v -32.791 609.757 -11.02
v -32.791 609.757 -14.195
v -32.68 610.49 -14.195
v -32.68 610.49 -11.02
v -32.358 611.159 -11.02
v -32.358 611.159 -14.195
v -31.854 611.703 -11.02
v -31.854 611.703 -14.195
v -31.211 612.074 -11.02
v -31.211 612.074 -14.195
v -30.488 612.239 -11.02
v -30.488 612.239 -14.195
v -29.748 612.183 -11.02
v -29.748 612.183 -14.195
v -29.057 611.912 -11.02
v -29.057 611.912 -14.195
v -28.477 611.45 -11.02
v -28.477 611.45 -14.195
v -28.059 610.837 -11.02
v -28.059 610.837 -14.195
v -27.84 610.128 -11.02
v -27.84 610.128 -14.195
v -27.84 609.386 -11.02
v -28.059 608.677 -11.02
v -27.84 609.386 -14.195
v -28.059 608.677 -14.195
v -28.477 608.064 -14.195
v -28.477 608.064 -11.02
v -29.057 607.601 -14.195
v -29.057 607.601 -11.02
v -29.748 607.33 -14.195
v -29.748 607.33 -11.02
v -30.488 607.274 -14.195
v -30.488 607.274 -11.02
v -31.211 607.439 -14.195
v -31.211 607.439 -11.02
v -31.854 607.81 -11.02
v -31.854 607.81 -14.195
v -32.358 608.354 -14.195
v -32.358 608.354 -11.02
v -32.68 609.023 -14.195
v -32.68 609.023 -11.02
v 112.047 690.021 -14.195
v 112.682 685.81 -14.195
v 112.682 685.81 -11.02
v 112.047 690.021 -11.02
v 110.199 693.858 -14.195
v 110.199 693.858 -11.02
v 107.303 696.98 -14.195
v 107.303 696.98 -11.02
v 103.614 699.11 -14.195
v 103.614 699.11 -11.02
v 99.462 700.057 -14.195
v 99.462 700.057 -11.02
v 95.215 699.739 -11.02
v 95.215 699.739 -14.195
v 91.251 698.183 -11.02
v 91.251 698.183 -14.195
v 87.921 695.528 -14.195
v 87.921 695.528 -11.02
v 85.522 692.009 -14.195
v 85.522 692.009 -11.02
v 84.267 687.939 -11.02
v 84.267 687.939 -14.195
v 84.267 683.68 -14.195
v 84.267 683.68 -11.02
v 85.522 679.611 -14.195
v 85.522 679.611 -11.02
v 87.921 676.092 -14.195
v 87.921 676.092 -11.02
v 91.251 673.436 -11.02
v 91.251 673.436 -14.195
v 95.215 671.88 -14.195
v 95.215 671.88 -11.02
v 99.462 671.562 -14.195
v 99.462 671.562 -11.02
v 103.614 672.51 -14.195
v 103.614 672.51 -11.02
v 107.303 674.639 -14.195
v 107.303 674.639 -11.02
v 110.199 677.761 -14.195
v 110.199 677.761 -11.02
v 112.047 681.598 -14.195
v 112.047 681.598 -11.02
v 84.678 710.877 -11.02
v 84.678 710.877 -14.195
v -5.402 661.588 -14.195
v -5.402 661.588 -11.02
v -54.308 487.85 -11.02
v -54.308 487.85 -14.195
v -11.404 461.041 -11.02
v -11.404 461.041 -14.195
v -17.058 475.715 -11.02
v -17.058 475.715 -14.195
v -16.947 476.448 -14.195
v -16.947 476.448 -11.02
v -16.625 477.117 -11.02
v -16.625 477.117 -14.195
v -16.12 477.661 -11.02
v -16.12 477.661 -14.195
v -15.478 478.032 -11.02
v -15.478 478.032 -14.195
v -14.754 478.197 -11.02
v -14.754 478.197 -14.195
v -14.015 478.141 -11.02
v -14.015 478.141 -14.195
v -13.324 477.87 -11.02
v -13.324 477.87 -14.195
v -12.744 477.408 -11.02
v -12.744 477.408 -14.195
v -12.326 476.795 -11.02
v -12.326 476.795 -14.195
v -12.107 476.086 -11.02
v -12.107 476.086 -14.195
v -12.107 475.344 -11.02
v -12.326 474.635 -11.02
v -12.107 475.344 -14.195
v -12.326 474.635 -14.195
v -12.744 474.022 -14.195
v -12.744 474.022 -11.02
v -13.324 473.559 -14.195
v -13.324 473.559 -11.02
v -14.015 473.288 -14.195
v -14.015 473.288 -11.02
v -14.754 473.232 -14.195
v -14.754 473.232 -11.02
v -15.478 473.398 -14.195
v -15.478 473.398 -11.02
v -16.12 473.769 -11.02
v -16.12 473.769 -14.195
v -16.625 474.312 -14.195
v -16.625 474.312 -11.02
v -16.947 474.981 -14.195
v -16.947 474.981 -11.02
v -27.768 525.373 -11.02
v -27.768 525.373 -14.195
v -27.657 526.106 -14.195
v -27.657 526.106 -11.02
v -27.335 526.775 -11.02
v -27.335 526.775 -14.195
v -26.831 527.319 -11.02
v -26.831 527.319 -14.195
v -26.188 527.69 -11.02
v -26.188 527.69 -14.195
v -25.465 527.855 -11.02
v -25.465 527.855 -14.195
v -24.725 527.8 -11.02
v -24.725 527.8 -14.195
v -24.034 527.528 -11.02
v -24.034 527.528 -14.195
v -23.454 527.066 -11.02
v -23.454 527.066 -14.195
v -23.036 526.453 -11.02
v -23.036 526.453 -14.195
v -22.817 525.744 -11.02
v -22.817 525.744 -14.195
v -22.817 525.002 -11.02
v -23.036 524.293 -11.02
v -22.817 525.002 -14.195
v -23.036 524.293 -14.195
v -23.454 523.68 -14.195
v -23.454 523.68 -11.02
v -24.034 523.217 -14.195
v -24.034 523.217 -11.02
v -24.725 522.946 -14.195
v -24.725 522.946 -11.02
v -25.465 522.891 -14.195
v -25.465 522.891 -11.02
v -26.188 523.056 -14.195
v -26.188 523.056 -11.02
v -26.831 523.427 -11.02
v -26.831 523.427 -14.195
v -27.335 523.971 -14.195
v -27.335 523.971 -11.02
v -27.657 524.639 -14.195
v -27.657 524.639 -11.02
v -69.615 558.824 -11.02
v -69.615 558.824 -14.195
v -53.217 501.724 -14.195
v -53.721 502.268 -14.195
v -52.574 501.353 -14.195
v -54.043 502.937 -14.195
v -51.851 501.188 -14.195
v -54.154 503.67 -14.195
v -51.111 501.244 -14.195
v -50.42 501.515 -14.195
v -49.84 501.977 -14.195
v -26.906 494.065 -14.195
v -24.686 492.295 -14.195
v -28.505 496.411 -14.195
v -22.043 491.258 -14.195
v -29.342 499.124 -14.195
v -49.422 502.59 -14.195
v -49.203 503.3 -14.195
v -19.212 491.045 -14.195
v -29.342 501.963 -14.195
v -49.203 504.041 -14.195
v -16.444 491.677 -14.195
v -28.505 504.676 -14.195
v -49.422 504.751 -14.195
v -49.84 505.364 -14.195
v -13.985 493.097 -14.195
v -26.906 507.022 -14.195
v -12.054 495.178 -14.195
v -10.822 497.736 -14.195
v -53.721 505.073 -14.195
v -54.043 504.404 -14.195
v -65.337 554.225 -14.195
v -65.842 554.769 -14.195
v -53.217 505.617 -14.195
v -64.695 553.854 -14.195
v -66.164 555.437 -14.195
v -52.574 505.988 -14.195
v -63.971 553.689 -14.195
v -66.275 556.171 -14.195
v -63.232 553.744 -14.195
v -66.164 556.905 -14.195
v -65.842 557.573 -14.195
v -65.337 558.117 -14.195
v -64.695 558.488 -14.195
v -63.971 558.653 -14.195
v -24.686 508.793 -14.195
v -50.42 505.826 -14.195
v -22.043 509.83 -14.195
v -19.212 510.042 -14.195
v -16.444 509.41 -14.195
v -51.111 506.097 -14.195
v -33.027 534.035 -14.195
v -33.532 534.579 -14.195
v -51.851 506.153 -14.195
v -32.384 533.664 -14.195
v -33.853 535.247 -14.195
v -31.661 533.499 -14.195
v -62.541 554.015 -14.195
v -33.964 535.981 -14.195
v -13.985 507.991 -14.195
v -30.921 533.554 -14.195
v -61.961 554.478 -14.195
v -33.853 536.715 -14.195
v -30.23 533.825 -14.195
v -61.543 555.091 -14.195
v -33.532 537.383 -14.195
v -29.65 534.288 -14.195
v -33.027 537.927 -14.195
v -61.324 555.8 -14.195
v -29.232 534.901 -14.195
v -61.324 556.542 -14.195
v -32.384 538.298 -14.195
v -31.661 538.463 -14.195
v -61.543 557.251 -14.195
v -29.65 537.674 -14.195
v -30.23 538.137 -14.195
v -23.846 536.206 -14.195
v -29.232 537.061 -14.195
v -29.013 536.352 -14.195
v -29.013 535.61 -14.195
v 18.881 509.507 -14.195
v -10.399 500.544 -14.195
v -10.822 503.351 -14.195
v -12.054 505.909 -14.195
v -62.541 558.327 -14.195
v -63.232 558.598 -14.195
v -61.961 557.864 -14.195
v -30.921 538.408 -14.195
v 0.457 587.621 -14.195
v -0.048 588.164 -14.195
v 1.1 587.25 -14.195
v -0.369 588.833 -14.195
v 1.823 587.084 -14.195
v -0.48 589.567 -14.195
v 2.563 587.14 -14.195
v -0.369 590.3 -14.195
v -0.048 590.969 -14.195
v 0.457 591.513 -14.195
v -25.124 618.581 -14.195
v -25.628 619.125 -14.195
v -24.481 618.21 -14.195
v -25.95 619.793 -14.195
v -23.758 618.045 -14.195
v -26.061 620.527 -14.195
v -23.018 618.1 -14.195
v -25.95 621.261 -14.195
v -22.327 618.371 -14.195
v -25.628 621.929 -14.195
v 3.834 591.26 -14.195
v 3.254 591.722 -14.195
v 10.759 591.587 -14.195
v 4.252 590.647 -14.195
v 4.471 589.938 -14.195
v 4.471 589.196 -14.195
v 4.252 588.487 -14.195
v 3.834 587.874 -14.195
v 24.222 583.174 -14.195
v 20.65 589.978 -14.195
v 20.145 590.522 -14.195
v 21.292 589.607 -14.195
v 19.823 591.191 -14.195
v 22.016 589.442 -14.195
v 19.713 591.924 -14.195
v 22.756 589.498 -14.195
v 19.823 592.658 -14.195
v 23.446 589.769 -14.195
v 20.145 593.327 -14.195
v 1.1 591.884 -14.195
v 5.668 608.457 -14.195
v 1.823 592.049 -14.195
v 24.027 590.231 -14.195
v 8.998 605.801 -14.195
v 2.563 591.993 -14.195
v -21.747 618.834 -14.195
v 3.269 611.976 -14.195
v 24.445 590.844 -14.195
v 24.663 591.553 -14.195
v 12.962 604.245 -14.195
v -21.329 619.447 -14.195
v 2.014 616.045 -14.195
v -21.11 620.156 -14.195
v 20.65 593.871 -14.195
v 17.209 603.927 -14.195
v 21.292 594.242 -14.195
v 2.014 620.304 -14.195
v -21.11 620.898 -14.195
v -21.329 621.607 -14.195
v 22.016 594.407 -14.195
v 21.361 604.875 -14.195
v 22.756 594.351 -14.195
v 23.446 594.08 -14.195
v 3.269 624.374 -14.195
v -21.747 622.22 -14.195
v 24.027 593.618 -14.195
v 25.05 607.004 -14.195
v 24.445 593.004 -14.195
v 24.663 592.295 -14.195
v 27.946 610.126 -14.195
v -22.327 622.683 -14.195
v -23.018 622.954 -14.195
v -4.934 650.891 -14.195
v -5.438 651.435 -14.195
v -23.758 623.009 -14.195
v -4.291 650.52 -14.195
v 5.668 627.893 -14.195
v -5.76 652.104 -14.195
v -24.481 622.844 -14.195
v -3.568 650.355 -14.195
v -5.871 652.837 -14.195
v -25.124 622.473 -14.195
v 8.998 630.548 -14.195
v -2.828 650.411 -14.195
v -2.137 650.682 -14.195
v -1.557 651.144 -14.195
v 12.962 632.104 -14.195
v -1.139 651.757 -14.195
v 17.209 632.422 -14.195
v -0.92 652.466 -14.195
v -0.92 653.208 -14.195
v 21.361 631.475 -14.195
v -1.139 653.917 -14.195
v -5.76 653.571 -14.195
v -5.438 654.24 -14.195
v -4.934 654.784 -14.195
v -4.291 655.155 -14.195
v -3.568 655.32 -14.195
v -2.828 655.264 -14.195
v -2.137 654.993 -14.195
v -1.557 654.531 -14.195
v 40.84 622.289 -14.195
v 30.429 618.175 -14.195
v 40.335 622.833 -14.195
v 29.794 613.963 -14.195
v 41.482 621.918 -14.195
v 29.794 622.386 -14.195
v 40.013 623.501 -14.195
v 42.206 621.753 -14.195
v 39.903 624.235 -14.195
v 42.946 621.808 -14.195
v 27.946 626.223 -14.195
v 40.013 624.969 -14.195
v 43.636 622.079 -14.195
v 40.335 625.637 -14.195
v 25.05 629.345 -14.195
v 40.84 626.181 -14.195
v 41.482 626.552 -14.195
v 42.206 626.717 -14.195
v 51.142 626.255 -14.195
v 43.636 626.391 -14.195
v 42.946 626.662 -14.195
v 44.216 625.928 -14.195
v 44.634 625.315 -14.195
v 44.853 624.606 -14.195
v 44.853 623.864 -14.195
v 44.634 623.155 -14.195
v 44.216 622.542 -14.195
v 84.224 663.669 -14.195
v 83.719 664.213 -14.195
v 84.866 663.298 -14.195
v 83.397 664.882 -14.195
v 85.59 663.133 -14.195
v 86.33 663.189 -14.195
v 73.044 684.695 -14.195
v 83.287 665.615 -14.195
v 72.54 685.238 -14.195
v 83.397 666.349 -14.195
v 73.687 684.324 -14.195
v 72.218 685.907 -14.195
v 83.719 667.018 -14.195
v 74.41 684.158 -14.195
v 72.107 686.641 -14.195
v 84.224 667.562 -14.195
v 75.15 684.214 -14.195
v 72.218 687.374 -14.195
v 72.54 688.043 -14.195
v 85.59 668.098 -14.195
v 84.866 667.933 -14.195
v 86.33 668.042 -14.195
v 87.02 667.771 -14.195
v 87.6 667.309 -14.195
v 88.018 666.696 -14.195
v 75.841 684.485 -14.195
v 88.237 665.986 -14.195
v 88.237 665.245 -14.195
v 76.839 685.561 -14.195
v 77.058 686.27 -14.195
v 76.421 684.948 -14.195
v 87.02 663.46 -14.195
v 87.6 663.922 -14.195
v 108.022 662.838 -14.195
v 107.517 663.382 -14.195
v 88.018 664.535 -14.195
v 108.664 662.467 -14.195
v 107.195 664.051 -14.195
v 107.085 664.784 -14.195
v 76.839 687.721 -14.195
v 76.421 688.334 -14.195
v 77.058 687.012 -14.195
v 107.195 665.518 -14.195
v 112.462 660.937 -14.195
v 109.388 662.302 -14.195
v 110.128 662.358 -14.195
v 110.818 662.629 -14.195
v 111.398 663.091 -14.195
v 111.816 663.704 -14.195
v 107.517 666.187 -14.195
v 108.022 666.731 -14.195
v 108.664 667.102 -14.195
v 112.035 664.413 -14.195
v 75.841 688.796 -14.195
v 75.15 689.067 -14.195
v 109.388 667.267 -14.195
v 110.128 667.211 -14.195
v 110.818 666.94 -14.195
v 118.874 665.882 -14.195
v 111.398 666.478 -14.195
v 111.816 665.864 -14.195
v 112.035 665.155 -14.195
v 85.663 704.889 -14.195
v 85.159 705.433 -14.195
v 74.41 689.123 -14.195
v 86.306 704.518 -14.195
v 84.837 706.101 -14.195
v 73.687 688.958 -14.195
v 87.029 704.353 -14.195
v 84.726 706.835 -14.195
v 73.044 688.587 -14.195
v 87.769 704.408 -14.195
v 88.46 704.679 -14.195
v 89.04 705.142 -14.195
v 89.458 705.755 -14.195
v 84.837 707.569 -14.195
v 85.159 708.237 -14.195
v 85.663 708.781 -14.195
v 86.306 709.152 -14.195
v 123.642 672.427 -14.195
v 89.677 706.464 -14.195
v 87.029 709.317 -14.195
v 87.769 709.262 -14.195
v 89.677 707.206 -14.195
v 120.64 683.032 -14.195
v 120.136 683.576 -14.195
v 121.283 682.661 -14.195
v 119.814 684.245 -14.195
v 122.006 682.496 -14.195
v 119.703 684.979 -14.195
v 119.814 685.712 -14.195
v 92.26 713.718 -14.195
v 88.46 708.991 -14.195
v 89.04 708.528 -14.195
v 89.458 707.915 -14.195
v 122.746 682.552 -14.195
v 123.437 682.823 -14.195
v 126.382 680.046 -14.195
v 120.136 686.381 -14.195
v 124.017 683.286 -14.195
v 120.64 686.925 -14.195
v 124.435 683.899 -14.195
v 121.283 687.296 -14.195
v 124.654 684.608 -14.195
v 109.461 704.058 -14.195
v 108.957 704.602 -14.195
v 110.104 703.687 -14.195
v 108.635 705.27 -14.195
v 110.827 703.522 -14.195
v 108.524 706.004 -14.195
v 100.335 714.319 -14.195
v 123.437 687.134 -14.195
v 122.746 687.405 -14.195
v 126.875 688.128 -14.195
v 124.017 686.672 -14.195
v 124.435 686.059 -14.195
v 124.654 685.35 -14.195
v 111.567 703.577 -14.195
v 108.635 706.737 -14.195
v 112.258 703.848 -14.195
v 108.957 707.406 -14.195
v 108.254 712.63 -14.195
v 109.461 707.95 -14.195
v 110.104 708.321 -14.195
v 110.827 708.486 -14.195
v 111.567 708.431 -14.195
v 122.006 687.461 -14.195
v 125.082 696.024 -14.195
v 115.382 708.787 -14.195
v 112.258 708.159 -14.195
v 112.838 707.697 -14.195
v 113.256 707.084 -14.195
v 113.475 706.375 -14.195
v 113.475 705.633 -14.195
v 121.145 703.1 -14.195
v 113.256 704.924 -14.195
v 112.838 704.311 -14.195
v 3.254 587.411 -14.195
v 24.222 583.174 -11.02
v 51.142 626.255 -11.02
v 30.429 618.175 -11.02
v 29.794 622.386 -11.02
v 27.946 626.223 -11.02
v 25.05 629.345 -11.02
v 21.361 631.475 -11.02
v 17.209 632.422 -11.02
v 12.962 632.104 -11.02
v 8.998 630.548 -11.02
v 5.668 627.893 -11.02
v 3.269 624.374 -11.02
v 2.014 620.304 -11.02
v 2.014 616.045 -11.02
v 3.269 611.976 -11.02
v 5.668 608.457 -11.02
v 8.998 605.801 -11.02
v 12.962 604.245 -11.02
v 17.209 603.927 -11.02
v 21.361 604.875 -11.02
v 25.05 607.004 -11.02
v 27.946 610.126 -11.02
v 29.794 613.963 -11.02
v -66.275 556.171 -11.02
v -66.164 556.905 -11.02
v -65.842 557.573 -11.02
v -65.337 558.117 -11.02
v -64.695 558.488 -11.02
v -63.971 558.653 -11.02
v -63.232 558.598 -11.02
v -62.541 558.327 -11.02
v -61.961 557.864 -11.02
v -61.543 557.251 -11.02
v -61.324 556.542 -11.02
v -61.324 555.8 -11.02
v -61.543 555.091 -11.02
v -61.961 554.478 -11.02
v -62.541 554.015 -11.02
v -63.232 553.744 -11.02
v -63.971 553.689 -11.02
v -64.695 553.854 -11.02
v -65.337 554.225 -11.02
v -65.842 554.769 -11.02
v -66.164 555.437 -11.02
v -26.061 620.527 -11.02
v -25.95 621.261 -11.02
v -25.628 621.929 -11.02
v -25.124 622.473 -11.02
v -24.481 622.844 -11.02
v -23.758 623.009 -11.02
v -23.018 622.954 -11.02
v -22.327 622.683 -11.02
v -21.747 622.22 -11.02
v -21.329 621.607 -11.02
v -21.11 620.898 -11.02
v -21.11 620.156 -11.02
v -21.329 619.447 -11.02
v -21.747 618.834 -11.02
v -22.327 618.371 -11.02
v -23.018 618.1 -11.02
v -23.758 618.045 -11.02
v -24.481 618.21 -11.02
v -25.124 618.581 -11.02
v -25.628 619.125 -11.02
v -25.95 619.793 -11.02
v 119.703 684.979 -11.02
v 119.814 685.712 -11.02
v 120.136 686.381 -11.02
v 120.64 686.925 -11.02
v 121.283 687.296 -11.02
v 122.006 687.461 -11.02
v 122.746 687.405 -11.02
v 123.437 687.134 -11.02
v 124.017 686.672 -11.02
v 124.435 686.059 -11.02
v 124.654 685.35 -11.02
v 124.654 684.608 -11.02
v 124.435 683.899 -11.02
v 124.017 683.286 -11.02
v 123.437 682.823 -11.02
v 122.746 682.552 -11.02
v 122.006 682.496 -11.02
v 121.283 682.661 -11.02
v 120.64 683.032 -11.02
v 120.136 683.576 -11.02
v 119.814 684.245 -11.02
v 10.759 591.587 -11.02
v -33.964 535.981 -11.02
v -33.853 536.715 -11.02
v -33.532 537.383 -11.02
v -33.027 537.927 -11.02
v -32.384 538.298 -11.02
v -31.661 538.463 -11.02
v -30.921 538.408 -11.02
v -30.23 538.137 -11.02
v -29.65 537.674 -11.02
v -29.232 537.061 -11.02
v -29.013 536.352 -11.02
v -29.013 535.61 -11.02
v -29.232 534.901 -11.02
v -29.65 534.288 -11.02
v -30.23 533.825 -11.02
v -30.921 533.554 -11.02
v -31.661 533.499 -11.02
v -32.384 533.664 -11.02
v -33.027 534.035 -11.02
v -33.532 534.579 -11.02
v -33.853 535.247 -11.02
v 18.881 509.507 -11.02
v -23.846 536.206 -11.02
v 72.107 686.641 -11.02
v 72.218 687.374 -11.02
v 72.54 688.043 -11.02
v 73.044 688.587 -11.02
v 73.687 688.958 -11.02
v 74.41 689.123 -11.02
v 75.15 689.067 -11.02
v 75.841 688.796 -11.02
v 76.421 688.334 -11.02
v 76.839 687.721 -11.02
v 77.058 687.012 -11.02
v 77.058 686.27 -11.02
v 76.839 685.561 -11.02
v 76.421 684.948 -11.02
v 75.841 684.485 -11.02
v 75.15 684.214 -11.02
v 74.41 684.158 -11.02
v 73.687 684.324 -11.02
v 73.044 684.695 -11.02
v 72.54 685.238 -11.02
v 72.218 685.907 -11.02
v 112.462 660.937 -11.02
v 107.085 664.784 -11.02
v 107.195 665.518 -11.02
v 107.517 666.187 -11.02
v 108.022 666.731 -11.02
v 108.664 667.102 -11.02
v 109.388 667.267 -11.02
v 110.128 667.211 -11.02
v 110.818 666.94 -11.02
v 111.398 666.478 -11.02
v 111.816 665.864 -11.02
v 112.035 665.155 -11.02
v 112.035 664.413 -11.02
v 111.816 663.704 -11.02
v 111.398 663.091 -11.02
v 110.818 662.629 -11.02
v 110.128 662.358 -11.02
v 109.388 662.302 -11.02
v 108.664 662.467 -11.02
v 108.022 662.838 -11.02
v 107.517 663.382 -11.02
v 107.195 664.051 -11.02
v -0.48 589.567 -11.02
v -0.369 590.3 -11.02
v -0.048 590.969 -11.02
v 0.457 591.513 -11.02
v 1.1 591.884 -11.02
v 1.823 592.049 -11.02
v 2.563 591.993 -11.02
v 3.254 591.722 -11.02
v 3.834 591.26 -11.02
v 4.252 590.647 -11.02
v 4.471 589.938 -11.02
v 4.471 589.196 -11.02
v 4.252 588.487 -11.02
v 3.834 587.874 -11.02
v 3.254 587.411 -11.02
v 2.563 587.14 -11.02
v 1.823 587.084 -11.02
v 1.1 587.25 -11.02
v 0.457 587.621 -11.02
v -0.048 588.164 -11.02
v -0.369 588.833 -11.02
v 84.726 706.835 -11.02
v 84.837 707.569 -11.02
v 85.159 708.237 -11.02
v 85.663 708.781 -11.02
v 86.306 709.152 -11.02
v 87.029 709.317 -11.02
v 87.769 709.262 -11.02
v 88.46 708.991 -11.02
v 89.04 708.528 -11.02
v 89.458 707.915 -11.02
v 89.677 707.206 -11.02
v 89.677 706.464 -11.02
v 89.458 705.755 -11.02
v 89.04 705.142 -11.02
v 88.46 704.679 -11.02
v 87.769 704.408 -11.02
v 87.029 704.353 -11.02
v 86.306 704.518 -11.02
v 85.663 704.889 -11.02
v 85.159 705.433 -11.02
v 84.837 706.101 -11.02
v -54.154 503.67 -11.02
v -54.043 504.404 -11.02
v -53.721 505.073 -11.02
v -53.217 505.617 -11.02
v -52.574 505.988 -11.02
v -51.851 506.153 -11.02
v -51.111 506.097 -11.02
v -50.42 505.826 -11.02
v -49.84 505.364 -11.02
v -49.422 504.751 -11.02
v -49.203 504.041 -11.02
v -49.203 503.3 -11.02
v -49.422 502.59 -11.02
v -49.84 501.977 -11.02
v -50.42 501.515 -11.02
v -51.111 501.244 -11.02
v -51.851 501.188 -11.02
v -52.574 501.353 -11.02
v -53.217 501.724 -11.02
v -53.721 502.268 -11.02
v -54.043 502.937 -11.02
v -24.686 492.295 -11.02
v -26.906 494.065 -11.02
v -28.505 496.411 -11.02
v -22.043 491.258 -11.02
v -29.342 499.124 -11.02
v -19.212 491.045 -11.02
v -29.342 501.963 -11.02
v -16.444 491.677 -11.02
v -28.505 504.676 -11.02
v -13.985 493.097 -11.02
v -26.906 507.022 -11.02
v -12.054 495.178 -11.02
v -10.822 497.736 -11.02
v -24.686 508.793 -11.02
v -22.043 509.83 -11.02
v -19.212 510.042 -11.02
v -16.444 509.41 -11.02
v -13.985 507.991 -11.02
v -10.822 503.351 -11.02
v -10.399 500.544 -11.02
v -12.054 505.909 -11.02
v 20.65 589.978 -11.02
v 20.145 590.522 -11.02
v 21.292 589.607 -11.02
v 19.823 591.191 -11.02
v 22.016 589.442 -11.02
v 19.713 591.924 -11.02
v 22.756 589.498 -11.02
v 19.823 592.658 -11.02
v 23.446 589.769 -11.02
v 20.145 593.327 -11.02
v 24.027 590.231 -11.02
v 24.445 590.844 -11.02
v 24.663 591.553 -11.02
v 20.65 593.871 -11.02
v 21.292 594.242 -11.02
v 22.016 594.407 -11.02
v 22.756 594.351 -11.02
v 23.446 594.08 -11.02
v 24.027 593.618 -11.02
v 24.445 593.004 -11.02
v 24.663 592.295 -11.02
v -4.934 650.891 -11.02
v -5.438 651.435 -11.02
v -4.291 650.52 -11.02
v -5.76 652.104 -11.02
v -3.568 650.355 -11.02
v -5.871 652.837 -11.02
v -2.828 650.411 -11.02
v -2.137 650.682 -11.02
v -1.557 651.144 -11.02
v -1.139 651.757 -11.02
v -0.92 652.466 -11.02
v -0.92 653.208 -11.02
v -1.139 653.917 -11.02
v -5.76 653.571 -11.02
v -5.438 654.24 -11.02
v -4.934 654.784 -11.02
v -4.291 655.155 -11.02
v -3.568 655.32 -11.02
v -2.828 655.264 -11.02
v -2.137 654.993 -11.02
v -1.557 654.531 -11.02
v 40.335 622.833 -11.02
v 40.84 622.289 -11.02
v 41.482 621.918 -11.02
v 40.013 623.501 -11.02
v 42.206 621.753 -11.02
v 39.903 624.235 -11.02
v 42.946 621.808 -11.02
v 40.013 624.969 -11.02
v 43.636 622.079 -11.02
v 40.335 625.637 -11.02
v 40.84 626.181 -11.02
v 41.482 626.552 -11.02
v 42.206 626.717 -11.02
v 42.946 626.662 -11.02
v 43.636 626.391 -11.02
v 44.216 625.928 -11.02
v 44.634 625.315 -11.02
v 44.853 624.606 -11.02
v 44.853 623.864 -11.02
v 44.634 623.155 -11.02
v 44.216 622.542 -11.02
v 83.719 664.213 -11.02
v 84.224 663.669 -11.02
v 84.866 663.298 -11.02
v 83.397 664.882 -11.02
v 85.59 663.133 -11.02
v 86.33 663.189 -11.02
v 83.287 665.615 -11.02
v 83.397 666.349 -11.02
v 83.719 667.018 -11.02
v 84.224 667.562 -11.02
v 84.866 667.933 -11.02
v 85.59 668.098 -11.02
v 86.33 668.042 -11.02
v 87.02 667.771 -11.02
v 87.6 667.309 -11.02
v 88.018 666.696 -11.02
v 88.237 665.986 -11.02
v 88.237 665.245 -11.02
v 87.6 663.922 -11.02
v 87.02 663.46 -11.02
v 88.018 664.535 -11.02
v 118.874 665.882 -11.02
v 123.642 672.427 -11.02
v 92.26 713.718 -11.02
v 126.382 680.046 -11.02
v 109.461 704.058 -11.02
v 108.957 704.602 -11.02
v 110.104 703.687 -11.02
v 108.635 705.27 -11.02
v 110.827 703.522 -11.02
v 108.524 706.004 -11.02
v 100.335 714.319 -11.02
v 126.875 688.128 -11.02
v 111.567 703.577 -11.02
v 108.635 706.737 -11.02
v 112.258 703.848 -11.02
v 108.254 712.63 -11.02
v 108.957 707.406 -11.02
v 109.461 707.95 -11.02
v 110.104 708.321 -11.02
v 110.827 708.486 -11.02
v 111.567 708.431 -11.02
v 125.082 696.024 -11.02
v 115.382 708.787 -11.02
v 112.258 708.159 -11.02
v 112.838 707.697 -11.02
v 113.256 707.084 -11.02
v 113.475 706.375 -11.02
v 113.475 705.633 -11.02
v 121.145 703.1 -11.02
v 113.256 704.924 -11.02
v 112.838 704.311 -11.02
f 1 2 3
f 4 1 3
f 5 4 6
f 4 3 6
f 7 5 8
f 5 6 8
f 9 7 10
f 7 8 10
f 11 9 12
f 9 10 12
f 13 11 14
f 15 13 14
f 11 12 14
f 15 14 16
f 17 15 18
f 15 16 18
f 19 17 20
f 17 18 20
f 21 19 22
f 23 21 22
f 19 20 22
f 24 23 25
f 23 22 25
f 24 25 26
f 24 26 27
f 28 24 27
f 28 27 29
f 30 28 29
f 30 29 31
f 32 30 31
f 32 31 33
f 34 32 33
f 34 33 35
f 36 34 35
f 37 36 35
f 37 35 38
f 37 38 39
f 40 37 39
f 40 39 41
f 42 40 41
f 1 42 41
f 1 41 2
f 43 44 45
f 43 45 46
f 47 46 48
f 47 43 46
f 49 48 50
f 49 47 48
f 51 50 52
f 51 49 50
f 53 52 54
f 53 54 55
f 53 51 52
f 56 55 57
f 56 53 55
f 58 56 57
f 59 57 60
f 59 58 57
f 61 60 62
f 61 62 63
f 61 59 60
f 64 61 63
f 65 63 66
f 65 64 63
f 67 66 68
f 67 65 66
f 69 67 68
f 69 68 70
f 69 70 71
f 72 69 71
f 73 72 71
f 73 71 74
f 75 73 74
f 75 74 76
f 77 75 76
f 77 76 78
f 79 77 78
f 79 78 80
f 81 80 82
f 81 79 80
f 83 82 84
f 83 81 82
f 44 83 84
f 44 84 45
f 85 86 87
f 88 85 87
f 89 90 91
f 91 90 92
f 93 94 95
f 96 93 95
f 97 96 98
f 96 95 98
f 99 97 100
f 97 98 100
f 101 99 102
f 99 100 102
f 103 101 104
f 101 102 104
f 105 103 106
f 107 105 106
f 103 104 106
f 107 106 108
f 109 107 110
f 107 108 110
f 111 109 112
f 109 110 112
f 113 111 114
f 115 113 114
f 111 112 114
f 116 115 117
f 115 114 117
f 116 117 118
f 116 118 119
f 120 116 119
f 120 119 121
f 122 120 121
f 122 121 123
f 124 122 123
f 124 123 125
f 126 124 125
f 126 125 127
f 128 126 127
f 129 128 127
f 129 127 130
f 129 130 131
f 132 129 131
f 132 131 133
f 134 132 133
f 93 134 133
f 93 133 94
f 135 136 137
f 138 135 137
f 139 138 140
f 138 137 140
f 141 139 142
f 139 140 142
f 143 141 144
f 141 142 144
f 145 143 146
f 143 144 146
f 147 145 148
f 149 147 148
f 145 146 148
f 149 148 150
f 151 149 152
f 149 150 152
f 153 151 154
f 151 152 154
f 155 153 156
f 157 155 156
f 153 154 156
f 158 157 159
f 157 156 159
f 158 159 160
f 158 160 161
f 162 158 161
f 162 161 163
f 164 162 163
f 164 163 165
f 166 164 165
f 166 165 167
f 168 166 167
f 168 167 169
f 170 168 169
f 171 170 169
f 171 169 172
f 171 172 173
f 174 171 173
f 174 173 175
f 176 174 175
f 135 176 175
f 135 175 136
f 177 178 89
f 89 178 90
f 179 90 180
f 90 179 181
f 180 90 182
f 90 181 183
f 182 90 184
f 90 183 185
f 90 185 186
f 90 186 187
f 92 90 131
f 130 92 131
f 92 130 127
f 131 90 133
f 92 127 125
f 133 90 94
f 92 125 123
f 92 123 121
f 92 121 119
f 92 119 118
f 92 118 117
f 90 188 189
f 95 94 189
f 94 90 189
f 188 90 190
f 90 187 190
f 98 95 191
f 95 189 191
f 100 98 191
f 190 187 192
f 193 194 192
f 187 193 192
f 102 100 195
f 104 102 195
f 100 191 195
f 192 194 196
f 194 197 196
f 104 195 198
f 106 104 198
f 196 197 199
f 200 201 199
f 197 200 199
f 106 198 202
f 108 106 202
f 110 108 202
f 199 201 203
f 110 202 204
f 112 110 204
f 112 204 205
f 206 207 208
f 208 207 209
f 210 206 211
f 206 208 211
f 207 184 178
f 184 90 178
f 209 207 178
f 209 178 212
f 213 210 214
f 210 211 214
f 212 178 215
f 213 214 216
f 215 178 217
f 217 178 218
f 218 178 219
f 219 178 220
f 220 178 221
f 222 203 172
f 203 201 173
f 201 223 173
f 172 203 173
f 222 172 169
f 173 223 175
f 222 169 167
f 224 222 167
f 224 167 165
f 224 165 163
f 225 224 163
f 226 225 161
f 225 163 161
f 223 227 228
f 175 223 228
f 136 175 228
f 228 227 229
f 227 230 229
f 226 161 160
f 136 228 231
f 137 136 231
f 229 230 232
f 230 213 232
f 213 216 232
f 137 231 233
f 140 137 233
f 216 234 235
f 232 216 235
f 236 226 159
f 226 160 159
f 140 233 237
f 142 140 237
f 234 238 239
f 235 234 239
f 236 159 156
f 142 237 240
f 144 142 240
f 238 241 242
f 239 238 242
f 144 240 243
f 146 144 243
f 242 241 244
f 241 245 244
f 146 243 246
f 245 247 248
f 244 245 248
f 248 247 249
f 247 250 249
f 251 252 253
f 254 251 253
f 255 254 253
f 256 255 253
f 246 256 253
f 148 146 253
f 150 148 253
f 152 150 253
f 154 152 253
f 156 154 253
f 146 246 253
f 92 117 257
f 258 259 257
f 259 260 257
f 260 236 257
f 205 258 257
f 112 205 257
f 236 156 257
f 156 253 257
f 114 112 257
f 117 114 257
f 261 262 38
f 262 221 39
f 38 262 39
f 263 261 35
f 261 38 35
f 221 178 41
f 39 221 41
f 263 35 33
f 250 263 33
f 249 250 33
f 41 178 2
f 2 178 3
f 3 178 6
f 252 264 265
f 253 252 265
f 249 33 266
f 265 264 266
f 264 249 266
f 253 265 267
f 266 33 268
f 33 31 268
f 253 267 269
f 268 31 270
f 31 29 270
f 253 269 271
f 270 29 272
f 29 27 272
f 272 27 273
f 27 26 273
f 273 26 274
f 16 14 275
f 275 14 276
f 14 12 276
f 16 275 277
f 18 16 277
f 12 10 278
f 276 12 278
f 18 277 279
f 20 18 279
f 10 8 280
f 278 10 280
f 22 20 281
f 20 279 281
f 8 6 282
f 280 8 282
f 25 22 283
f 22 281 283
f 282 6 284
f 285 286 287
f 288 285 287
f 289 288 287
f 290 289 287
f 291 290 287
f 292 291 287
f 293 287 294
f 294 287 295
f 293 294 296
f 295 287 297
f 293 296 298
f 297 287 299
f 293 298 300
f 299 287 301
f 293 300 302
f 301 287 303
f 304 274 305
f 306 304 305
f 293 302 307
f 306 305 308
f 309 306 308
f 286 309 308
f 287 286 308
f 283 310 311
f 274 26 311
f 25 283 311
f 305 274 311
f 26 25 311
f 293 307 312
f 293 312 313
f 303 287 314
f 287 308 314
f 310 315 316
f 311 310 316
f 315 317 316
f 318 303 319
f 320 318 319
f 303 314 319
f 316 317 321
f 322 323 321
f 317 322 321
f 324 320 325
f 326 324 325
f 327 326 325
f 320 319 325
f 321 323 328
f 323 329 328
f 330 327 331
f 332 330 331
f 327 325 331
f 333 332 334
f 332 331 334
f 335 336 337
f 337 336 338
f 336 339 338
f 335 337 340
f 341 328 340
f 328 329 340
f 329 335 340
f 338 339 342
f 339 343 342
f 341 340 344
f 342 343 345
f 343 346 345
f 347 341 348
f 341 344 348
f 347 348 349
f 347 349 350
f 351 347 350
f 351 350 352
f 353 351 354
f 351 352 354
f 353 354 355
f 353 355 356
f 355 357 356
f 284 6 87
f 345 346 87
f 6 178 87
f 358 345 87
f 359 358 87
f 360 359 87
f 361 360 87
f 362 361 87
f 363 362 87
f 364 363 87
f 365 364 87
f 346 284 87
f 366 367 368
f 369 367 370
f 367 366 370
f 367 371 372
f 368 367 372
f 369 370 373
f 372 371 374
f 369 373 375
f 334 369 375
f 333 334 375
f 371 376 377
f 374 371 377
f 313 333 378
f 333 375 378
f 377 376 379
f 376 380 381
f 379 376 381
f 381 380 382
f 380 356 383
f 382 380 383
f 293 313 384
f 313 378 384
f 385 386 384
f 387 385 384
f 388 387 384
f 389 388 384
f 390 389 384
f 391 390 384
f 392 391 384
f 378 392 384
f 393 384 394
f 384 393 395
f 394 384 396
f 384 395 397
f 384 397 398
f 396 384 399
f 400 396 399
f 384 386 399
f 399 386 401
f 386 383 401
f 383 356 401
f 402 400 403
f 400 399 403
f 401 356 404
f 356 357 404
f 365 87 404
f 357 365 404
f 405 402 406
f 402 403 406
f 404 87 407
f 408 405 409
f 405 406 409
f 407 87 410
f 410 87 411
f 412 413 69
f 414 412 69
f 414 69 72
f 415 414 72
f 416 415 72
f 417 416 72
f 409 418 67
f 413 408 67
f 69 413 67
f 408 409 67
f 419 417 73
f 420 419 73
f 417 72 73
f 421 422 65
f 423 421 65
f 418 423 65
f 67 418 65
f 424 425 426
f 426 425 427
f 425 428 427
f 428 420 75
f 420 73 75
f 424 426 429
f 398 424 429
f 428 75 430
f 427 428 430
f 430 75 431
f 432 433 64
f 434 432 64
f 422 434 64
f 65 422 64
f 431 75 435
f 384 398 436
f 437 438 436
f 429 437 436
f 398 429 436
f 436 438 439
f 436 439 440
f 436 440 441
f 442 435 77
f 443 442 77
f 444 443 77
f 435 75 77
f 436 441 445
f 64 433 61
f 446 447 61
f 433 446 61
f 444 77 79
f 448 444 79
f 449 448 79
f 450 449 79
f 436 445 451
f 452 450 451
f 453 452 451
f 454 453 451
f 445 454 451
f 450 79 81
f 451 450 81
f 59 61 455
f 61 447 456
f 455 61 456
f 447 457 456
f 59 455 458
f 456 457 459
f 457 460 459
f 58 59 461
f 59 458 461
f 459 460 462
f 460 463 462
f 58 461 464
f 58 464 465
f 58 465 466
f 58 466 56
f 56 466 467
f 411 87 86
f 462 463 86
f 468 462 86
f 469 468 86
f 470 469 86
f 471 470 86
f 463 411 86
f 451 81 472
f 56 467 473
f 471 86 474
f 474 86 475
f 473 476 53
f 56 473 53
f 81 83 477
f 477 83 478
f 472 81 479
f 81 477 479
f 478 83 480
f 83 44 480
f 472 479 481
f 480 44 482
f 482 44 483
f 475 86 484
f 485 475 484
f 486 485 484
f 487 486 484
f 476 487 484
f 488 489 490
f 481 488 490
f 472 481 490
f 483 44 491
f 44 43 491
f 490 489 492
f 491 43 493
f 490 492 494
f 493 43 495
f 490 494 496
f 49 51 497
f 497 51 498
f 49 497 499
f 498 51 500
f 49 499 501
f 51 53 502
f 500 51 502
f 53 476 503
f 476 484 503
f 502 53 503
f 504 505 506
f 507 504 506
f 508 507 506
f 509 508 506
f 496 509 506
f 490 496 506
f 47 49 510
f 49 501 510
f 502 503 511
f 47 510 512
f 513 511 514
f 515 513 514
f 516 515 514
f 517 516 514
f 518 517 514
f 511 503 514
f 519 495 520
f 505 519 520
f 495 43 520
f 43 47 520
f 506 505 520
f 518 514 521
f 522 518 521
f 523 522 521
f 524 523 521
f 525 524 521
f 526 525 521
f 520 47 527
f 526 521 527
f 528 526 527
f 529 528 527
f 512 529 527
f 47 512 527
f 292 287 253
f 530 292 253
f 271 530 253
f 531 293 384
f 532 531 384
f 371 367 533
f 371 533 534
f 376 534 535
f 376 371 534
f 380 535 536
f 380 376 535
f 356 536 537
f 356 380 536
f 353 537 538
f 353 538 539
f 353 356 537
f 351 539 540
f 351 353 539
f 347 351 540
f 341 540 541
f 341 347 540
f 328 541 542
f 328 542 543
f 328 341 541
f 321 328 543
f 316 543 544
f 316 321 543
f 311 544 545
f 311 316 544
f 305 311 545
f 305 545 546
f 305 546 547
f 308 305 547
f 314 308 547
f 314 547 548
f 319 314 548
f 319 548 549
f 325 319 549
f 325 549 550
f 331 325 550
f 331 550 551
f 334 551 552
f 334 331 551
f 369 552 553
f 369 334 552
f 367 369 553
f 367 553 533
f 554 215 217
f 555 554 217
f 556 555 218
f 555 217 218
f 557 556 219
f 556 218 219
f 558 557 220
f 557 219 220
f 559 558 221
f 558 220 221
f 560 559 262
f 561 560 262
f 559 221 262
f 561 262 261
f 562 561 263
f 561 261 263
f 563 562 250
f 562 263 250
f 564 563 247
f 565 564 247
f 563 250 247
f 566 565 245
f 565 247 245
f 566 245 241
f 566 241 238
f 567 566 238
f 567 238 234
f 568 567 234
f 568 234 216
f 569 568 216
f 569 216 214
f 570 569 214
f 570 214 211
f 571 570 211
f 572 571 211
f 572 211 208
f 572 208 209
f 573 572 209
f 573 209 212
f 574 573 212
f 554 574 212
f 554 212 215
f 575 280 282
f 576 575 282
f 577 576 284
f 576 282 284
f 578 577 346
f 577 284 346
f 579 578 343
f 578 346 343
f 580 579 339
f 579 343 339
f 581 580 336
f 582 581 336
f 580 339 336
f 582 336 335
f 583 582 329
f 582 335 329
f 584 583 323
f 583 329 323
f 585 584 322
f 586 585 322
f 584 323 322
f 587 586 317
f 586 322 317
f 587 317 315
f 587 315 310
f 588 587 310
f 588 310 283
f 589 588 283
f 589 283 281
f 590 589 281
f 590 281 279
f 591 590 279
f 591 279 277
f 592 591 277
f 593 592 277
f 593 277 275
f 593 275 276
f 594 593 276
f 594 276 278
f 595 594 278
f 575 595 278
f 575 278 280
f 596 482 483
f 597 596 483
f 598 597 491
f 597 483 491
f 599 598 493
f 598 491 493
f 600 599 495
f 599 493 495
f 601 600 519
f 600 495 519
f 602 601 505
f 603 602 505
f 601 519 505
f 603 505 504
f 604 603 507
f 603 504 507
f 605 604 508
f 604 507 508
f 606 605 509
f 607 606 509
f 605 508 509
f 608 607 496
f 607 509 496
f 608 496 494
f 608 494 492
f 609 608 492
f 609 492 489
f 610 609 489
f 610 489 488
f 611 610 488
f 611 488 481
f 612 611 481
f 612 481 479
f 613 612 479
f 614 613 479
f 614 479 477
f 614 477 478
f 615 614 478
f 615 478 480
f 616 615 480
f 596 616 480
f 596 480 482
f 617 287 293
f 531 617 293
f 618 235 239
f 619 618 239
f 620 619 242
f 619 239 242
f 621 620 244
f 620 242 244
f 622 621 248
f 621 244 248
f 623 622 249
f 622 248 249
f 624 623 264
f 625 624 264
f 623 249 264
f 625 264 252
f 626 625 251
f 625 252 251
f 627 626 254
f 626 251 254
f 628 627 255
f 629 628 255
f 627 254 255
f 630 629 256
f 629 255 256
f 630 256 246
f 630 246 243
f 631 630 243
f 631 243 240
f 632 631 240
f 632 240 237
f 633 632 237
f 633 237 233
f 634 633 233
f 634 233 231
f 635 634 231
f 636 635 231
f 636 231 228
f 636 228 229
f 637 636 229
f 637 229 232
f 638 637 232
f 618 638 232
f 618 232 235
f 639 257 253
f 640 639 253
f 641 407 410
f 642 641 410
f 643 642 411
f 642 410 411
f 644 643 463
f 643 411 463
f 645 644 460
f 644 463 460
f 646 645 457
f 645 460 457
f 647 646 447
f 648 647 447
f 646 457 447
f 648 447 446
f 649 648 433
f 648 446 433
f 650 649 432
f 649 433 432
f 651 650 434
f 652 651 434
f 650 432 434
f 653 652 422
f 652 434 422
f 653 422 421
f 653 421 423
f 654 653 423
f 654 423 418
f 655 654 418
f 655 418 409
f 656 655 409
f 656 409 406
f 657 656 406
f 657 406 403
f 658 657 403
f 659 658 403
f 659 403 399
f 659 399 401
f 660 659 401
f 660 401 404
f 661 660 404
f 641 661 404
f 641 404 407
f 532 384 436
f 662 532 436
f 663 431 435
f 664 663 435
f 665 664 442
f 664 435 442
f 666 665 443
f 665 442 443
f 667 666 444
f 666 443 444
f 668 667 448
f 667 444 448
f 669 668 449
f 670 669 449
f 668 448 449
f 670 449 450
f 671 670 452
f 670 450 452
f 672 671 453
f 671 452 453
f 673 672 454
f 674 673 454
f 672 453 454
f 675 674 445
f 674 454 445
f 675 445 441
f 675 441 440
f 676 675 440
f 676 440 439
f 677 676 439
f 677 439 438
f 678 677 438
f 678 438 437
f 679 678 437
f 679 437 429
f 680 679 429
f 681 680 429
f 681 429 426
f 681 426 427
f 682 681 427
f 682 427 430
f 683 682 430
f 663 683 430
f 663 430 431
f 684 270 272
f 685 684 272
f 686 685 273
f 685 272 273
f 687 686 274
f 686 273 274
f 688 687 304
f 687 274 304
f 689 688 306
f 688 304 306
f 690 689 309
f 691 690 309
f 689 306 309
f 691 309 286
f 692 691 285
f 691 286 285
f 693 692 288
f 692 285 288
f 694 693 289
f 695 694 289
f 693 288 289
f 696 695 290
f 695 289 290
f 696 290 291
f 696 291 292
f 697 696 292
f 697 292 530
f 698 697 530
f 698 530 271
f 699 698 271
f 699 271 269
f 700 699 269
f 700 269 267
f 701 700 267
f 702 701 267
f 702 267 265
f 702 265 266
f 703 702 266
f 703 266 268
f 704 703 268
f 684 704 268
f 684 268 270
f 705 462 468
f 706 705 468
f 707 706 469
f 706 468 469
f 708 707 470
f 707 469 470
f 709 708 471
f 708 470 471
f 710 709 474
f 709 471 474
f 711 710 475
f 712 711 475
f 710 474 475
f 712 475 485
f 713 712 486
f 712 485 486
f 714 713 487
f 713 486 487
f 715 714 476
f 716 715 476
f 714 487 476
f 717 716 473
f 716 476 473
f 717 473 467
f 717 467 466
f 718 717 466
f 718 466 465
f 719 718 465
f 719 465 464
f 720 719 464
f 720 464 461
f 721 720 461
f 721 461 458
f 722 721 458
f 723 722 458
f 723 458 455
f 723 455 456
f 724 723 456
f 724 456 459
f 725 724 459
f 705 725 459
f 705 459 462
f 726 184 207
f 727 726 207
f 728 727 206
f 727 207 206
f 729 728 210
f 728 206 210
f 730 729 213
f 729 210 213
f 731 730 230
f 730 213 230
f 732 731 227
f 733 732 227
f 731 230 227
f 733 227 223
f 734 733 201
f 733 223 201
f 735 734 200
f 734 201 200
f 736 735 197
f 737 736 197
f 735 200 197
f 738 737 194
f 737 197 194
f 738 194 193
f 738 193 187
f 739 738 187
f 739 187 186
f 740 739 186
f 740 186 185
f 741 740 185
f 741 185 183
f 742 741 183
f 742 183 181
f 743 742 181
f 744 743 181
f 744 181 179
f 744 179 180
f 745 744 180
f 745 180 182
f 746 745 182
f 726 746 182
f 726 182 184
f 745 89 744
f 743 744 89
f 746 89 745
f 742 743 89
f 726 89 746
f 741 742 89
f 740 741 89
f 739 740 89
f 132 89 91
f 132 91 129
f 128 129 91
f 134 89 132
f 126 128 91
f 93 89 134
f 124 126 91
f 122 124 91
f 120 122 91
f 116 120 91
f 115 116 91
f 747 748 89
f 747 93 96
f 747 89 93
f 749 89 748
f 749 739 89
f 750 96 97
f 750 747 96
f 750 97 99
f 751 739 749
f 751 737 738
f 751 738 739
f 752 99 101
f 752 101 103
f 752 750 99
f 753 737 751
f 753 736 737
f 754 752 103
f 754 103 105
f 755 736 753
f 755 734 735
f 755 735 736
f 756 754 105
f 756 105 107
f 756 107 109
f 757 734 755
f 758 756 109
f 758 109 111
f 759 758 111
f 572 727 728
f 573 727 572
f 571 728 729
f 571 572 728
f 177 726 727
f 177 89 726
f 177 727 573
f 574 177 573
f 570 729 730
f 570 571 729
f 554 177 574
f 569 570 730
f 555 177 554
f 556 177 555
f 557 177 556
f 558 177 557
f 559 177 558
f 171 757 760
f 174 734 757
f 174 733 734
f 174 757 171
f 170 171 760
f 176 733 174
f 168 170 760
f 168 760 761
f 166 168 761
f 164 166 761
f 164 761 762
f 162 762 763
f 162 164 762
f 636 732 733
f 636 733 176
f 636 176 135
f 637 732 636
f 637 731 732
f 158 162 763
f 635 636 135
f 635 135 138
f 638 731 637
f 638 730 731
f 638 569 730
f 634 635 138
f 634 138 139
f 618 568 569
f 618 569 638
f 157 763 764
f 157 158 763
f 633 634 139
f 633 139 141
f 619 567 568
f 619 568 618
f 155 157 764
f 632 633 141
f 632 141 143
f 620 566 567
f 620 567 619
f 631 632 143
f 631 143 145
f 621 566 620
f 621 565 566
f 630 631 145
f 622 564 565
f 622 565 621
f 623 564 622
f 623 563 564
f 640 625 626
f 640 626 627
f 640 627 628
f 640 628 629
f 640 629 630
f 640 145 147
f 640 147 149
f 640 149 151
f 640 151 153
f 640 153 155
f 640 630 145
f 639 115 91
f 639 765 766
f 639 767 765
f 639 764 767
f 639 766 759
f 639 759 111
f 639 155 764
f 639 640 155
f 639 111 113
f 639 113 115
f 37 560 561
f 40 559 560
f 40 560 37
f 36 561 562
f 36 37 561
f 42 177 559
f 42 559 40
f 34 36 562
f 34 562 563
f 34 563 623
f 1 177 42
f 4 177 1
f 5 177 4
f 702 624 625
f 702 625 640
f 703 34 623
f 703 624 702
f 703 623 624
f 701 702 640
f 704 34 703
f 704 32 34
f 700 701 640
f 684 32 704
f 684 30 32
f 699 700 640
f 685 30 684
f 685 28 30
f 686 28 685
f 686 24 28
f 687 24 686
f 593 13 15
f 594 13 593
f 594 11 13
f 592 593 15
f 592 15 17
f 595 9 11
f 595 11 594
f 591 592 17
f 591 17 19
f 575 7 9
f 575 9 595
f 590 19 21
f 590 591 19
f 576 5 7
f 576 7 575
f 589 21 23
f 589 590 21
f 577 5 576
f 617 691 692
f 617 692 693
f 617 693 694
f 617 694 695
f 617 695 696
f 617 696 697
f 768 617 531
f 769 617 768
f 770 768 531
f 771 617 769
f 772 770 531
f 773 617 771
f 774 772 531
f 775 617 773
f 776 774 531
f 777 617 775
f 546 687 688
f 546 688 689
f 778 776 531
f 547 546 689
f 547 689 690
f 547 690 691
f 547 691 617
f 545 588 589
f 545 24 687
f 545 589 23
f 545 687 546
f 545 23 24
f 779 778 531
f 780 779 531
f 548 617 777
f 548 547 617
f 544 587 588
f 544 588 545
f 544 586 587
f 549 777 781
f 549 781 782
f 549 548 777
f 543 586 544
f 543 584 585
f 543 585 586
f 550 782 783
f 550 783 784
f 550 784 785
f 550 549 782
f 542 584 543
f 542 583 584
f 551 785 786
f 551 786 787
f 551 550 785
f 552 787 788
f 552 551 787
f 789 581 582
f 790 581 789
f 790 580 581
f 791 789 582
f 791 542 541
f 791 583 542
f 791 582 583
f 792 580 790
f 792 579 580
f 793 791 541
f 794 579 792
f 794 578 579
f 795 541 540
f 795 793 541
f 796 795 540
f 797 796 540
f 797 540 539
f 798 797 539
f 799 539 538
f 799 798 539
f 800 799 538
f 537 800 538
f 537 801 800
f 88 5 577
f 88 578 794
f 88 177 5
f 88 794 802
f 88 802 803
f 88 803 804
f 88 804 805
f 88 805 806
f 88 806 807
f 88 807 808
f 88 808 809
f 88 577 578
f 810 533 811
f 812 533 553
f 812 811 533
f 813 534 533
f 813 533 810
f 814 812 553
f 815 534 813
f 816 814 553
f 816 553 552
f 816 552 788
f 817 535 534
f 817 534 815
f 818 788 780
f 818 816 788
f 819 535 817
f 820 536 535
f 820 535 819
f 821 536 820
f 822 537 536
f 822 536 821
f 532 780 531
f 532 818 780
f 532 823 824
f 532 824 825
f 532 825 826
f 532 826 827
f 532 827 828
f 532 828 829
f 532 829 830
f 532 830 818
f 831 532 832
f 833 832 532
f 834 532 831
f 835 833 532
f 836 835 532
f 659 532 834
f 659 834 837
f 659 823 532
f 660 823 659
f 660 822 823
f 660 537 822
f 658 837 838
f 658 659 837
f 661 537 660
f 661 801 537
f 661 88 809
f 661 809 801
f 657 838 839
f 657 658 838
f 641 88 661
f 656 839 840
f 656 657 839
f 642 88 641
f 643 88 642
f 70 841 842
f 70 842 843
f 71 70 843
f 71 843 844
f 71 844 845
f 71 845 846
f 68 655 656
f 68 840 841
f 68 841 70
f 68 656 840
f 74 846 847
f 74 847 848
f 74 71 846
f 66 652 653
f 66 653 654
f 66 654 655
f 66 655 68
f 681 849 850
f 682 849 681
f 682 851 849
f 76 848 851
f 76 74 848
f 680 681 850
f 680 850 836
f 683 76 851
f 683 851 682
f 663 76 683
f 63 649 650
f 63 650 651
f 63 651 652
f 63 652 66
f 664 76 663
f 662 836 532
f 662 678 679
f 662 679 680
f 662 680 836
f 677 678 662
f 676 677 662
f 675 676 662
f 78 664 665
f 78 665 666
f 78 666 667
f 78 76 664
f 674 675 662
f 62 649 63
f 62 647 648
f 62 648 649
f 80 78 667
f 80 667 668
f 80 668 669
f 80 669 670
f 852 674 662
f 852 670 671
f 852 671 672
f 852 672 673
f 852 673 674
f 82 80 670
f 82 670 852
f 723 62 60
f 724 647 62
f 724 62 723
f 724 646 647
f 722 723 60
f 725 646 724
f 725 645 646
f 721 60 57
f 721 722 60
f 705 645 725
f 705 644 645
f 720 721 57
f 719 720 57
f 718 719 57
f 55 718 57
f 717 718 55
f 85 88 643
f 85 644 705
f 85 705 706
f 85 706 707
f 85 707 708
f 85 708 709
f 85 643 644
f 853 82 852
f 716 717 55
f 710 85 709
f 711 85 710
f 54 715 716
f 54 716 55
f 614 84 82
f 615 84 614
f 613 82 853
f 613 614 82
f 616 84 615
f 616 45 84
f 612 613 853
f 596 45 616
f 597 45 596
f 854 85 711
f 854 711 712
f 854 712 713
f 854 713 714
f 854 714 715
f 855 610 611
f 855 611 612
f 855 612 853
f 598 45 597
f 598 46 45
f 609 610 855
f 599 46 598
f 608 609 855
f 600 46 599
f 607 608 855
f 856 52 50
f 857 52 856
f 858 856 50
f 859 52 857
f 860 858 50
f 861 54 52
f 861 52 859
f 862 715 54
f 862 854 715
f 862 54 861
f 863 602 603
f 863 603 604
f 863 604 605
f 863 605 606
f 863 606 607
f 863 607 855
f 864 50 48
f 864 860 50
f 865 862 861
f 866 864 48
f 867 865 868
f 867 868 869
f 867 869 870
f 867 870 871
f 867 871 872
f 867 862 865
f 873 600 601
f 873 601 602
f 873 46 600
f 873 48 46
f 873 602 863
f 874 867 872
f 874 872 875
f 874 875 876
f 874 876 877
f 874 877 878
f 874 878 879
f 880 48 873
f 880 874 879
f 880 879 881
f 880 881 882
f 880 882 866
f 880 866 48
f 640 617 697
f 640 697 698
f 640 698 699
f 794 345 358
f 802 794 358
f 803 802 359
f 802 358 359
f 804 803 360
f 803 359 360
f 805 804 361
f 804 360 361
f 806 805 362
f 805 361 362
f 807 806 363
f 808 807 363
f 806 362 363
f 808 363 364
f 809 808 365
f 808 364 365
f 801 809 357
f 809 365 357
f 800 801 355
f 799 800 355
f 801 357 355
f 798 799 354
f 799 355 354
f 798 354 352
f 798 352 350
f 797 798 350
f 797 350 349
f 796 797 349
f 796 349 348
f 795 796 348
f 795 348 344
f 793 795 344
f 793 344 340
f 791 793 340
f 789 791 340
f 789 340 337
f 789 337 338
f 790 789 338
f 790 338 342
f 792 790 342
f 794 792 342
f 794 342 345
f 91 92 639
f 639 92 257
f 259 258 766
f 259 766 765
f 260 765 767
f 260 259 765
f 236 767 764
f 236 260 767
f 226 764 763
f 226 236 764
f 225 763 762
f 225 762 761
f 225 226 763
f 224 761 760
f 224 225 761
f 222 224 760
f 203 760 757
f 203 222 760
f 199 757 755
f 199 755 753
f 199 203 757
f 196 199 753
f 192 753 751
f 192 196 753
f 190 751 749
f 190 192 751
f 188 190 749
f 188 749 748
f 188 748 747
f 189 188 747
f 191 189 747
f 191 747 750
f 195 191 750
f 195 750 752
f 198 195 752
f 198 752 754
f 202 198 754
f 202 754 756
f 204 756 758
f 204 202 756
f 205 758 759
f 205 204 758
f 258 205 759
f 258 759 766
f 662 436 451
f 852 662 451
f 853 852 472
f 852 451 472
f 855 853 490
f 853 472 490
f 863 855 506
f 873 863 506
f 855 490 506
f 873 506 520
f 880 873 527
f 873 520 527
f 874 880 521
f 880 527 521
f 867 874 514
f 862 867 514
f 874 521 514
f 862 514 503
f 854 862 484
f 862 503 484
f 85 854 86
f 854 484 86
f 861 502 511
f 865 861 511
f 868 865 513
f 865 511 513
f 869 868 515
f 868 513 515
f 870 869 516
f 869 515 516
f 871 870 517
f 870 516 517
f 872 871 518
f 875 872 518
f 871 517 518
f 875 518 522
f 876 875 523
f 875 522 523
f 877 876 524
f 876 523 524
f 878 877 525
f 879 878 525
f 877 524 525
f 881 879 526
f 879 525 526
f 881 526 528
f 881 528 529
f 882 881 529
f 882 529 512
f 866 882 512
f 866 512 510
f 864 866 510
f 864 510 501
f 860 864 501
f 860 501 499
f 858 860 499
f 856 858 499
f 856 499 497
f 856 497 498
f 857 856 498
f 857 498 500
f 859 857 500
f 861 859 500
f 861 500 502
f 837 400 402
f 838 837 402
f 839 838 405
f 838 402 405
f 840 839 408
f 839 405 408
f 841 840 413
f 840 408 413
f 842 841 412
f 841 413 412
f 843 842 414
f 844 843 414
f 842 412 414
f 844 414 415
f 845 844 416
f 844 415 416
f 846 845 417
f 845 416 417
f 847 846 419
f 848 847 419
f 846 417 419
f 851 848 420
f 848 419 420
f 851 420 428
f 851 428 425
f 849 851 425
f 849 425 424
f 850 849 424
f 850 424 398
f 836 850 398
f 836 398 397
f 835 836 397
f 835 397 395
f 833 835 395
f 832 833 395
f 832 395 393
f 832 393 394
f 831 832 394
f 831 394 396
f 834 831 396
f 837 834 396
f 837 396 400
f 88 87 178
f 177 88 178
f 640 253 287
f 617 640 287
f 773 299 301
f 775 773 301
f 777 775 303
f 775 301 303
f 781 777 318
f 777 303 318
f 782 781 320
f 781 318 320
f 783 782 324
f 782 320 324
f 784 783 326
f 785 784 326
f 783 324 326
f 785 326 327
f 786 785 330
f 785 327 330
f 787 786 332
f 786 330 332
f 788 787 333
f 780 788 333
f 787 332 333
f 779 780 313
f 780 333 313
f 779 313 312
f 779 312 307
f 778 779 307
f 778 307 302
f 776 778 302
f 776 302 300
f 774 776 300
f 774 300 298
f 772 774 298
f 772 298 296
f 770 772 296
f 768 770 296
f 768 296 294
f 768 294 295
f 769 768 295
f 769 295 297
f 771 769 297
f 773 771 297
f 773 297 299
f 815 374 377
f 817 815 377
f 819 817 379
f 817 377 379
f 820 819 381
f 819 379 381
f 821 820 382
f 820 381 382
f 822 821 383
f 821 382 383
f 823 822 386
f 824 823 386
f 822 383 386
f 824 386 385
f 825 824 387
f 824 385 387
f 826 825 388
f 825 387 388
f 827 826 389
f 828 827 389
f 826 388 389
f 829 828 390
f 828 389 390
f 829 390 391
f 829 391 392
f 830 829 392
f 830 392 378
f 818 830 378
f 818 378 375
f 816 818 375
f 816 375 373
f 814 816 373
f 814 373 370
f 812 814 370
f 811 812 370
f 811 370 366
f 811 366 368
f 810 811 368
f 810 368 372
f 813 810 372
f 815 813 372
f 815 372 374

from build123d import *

# Parameters (mm, degrees)
SKETCH1_R              = 14.2875
SKETCH1_R_2            = 9.525
BOSS_EXTRUDE1_DEPTH    = 3.175
F_10_CLEARANCE_HOLE2_D = 4.9784
F_10_CLEARANCE_HOLE3_D = 4.9784


with BuildPart() as part:
    # Sketch1 → Boss-Extrude1 (new body)
    with BuildSketch(Plane.XY.offset(-14.194599474)):
        with BuildLine():
            Line((-11.403602879, 461.040918113), (18.881283072, 509.506866808))
            Line((18.881283072, 509.506866808), (-23.846467356, 536.206128526))
            Line((-23.846467356, 536.206128526), (10.759214603, 591.586796266))
            Line((10.759214603, 591.586796266), (24.22197813, 583.174327946))
            Line((24.22197813, 583.174327946), (51.141876753, 626.255171231))
            Line((51.141876753, 626.255171231), (112.462044501, 660.93728694))
            ThreePointArc((112.462044501, 660.93728694), (123.365099157, 699.702028841), (84.677956887, 710.877306848))
            Line((84.677956887, 710.877306848), (-5.401730059, 661.587538174))
            Line((-5.401730059, 661.587538174), (-69.615486106, 558.824047132))
            Line((-69.615486106, 558.824047132), (-54.307899735, 487.850498283))
            Line((-54.307899735, 487.850498283), (-11.403602879, 461.040918113))
        make_face()
        with Locations((16.14150623, 618.174698631)):
            Circle(SKETCH1_R, mode=Mode.SUBTRACT)
        with Locations((-19.923573493, 500.543719921)):
            Circle(SKETCH1_R_2, mode=Mode.SUBTRACT)
        with Locations((98.394472266, 685.809641802)):
            Circle(SKETCH1_R, mode=Mode.SUBTRACT)
    extrude(amount=BOSS_EXTRUDE1_DEPTH)

    # #10 Clearance Hole2 (through all)
    with Locations(Plane.XY.offset(-11.019599474)):
        with Locations((-25.278710379, 525.37278573), (-14.568436607, 475.714654113), (-3.381611976, 652.837445435), (42.391784014, 624.235053148), (22.201860047, 591.924420685), (-23.571535943, 620.526812972), (-31.474844299, 535.981130963), (-63.785476762, 556.17105493), (-51.664768266, 503.670498499), (2.009121865, 589.566678183), (-30.301510599, 609.756602151)):
            Hole(F_10_CLEARANCE_HOLE2_D / 2)

    # #10 Clearance Hole3 (through all)
    with Locations(Plane.XY.offset(-11.019599474)):
        with Locations((111.013174745, 706.003787092), (122.192466334, 684.978597537), (109.573763855, 664.784452247), (85.775769786, 665.615496512), (74.596478197, 686.640686067), (87.215180677, 706.834831357)):
            Hole(F_10_CLEARANCE_HOLE3_D / 2)


solid = part.part
